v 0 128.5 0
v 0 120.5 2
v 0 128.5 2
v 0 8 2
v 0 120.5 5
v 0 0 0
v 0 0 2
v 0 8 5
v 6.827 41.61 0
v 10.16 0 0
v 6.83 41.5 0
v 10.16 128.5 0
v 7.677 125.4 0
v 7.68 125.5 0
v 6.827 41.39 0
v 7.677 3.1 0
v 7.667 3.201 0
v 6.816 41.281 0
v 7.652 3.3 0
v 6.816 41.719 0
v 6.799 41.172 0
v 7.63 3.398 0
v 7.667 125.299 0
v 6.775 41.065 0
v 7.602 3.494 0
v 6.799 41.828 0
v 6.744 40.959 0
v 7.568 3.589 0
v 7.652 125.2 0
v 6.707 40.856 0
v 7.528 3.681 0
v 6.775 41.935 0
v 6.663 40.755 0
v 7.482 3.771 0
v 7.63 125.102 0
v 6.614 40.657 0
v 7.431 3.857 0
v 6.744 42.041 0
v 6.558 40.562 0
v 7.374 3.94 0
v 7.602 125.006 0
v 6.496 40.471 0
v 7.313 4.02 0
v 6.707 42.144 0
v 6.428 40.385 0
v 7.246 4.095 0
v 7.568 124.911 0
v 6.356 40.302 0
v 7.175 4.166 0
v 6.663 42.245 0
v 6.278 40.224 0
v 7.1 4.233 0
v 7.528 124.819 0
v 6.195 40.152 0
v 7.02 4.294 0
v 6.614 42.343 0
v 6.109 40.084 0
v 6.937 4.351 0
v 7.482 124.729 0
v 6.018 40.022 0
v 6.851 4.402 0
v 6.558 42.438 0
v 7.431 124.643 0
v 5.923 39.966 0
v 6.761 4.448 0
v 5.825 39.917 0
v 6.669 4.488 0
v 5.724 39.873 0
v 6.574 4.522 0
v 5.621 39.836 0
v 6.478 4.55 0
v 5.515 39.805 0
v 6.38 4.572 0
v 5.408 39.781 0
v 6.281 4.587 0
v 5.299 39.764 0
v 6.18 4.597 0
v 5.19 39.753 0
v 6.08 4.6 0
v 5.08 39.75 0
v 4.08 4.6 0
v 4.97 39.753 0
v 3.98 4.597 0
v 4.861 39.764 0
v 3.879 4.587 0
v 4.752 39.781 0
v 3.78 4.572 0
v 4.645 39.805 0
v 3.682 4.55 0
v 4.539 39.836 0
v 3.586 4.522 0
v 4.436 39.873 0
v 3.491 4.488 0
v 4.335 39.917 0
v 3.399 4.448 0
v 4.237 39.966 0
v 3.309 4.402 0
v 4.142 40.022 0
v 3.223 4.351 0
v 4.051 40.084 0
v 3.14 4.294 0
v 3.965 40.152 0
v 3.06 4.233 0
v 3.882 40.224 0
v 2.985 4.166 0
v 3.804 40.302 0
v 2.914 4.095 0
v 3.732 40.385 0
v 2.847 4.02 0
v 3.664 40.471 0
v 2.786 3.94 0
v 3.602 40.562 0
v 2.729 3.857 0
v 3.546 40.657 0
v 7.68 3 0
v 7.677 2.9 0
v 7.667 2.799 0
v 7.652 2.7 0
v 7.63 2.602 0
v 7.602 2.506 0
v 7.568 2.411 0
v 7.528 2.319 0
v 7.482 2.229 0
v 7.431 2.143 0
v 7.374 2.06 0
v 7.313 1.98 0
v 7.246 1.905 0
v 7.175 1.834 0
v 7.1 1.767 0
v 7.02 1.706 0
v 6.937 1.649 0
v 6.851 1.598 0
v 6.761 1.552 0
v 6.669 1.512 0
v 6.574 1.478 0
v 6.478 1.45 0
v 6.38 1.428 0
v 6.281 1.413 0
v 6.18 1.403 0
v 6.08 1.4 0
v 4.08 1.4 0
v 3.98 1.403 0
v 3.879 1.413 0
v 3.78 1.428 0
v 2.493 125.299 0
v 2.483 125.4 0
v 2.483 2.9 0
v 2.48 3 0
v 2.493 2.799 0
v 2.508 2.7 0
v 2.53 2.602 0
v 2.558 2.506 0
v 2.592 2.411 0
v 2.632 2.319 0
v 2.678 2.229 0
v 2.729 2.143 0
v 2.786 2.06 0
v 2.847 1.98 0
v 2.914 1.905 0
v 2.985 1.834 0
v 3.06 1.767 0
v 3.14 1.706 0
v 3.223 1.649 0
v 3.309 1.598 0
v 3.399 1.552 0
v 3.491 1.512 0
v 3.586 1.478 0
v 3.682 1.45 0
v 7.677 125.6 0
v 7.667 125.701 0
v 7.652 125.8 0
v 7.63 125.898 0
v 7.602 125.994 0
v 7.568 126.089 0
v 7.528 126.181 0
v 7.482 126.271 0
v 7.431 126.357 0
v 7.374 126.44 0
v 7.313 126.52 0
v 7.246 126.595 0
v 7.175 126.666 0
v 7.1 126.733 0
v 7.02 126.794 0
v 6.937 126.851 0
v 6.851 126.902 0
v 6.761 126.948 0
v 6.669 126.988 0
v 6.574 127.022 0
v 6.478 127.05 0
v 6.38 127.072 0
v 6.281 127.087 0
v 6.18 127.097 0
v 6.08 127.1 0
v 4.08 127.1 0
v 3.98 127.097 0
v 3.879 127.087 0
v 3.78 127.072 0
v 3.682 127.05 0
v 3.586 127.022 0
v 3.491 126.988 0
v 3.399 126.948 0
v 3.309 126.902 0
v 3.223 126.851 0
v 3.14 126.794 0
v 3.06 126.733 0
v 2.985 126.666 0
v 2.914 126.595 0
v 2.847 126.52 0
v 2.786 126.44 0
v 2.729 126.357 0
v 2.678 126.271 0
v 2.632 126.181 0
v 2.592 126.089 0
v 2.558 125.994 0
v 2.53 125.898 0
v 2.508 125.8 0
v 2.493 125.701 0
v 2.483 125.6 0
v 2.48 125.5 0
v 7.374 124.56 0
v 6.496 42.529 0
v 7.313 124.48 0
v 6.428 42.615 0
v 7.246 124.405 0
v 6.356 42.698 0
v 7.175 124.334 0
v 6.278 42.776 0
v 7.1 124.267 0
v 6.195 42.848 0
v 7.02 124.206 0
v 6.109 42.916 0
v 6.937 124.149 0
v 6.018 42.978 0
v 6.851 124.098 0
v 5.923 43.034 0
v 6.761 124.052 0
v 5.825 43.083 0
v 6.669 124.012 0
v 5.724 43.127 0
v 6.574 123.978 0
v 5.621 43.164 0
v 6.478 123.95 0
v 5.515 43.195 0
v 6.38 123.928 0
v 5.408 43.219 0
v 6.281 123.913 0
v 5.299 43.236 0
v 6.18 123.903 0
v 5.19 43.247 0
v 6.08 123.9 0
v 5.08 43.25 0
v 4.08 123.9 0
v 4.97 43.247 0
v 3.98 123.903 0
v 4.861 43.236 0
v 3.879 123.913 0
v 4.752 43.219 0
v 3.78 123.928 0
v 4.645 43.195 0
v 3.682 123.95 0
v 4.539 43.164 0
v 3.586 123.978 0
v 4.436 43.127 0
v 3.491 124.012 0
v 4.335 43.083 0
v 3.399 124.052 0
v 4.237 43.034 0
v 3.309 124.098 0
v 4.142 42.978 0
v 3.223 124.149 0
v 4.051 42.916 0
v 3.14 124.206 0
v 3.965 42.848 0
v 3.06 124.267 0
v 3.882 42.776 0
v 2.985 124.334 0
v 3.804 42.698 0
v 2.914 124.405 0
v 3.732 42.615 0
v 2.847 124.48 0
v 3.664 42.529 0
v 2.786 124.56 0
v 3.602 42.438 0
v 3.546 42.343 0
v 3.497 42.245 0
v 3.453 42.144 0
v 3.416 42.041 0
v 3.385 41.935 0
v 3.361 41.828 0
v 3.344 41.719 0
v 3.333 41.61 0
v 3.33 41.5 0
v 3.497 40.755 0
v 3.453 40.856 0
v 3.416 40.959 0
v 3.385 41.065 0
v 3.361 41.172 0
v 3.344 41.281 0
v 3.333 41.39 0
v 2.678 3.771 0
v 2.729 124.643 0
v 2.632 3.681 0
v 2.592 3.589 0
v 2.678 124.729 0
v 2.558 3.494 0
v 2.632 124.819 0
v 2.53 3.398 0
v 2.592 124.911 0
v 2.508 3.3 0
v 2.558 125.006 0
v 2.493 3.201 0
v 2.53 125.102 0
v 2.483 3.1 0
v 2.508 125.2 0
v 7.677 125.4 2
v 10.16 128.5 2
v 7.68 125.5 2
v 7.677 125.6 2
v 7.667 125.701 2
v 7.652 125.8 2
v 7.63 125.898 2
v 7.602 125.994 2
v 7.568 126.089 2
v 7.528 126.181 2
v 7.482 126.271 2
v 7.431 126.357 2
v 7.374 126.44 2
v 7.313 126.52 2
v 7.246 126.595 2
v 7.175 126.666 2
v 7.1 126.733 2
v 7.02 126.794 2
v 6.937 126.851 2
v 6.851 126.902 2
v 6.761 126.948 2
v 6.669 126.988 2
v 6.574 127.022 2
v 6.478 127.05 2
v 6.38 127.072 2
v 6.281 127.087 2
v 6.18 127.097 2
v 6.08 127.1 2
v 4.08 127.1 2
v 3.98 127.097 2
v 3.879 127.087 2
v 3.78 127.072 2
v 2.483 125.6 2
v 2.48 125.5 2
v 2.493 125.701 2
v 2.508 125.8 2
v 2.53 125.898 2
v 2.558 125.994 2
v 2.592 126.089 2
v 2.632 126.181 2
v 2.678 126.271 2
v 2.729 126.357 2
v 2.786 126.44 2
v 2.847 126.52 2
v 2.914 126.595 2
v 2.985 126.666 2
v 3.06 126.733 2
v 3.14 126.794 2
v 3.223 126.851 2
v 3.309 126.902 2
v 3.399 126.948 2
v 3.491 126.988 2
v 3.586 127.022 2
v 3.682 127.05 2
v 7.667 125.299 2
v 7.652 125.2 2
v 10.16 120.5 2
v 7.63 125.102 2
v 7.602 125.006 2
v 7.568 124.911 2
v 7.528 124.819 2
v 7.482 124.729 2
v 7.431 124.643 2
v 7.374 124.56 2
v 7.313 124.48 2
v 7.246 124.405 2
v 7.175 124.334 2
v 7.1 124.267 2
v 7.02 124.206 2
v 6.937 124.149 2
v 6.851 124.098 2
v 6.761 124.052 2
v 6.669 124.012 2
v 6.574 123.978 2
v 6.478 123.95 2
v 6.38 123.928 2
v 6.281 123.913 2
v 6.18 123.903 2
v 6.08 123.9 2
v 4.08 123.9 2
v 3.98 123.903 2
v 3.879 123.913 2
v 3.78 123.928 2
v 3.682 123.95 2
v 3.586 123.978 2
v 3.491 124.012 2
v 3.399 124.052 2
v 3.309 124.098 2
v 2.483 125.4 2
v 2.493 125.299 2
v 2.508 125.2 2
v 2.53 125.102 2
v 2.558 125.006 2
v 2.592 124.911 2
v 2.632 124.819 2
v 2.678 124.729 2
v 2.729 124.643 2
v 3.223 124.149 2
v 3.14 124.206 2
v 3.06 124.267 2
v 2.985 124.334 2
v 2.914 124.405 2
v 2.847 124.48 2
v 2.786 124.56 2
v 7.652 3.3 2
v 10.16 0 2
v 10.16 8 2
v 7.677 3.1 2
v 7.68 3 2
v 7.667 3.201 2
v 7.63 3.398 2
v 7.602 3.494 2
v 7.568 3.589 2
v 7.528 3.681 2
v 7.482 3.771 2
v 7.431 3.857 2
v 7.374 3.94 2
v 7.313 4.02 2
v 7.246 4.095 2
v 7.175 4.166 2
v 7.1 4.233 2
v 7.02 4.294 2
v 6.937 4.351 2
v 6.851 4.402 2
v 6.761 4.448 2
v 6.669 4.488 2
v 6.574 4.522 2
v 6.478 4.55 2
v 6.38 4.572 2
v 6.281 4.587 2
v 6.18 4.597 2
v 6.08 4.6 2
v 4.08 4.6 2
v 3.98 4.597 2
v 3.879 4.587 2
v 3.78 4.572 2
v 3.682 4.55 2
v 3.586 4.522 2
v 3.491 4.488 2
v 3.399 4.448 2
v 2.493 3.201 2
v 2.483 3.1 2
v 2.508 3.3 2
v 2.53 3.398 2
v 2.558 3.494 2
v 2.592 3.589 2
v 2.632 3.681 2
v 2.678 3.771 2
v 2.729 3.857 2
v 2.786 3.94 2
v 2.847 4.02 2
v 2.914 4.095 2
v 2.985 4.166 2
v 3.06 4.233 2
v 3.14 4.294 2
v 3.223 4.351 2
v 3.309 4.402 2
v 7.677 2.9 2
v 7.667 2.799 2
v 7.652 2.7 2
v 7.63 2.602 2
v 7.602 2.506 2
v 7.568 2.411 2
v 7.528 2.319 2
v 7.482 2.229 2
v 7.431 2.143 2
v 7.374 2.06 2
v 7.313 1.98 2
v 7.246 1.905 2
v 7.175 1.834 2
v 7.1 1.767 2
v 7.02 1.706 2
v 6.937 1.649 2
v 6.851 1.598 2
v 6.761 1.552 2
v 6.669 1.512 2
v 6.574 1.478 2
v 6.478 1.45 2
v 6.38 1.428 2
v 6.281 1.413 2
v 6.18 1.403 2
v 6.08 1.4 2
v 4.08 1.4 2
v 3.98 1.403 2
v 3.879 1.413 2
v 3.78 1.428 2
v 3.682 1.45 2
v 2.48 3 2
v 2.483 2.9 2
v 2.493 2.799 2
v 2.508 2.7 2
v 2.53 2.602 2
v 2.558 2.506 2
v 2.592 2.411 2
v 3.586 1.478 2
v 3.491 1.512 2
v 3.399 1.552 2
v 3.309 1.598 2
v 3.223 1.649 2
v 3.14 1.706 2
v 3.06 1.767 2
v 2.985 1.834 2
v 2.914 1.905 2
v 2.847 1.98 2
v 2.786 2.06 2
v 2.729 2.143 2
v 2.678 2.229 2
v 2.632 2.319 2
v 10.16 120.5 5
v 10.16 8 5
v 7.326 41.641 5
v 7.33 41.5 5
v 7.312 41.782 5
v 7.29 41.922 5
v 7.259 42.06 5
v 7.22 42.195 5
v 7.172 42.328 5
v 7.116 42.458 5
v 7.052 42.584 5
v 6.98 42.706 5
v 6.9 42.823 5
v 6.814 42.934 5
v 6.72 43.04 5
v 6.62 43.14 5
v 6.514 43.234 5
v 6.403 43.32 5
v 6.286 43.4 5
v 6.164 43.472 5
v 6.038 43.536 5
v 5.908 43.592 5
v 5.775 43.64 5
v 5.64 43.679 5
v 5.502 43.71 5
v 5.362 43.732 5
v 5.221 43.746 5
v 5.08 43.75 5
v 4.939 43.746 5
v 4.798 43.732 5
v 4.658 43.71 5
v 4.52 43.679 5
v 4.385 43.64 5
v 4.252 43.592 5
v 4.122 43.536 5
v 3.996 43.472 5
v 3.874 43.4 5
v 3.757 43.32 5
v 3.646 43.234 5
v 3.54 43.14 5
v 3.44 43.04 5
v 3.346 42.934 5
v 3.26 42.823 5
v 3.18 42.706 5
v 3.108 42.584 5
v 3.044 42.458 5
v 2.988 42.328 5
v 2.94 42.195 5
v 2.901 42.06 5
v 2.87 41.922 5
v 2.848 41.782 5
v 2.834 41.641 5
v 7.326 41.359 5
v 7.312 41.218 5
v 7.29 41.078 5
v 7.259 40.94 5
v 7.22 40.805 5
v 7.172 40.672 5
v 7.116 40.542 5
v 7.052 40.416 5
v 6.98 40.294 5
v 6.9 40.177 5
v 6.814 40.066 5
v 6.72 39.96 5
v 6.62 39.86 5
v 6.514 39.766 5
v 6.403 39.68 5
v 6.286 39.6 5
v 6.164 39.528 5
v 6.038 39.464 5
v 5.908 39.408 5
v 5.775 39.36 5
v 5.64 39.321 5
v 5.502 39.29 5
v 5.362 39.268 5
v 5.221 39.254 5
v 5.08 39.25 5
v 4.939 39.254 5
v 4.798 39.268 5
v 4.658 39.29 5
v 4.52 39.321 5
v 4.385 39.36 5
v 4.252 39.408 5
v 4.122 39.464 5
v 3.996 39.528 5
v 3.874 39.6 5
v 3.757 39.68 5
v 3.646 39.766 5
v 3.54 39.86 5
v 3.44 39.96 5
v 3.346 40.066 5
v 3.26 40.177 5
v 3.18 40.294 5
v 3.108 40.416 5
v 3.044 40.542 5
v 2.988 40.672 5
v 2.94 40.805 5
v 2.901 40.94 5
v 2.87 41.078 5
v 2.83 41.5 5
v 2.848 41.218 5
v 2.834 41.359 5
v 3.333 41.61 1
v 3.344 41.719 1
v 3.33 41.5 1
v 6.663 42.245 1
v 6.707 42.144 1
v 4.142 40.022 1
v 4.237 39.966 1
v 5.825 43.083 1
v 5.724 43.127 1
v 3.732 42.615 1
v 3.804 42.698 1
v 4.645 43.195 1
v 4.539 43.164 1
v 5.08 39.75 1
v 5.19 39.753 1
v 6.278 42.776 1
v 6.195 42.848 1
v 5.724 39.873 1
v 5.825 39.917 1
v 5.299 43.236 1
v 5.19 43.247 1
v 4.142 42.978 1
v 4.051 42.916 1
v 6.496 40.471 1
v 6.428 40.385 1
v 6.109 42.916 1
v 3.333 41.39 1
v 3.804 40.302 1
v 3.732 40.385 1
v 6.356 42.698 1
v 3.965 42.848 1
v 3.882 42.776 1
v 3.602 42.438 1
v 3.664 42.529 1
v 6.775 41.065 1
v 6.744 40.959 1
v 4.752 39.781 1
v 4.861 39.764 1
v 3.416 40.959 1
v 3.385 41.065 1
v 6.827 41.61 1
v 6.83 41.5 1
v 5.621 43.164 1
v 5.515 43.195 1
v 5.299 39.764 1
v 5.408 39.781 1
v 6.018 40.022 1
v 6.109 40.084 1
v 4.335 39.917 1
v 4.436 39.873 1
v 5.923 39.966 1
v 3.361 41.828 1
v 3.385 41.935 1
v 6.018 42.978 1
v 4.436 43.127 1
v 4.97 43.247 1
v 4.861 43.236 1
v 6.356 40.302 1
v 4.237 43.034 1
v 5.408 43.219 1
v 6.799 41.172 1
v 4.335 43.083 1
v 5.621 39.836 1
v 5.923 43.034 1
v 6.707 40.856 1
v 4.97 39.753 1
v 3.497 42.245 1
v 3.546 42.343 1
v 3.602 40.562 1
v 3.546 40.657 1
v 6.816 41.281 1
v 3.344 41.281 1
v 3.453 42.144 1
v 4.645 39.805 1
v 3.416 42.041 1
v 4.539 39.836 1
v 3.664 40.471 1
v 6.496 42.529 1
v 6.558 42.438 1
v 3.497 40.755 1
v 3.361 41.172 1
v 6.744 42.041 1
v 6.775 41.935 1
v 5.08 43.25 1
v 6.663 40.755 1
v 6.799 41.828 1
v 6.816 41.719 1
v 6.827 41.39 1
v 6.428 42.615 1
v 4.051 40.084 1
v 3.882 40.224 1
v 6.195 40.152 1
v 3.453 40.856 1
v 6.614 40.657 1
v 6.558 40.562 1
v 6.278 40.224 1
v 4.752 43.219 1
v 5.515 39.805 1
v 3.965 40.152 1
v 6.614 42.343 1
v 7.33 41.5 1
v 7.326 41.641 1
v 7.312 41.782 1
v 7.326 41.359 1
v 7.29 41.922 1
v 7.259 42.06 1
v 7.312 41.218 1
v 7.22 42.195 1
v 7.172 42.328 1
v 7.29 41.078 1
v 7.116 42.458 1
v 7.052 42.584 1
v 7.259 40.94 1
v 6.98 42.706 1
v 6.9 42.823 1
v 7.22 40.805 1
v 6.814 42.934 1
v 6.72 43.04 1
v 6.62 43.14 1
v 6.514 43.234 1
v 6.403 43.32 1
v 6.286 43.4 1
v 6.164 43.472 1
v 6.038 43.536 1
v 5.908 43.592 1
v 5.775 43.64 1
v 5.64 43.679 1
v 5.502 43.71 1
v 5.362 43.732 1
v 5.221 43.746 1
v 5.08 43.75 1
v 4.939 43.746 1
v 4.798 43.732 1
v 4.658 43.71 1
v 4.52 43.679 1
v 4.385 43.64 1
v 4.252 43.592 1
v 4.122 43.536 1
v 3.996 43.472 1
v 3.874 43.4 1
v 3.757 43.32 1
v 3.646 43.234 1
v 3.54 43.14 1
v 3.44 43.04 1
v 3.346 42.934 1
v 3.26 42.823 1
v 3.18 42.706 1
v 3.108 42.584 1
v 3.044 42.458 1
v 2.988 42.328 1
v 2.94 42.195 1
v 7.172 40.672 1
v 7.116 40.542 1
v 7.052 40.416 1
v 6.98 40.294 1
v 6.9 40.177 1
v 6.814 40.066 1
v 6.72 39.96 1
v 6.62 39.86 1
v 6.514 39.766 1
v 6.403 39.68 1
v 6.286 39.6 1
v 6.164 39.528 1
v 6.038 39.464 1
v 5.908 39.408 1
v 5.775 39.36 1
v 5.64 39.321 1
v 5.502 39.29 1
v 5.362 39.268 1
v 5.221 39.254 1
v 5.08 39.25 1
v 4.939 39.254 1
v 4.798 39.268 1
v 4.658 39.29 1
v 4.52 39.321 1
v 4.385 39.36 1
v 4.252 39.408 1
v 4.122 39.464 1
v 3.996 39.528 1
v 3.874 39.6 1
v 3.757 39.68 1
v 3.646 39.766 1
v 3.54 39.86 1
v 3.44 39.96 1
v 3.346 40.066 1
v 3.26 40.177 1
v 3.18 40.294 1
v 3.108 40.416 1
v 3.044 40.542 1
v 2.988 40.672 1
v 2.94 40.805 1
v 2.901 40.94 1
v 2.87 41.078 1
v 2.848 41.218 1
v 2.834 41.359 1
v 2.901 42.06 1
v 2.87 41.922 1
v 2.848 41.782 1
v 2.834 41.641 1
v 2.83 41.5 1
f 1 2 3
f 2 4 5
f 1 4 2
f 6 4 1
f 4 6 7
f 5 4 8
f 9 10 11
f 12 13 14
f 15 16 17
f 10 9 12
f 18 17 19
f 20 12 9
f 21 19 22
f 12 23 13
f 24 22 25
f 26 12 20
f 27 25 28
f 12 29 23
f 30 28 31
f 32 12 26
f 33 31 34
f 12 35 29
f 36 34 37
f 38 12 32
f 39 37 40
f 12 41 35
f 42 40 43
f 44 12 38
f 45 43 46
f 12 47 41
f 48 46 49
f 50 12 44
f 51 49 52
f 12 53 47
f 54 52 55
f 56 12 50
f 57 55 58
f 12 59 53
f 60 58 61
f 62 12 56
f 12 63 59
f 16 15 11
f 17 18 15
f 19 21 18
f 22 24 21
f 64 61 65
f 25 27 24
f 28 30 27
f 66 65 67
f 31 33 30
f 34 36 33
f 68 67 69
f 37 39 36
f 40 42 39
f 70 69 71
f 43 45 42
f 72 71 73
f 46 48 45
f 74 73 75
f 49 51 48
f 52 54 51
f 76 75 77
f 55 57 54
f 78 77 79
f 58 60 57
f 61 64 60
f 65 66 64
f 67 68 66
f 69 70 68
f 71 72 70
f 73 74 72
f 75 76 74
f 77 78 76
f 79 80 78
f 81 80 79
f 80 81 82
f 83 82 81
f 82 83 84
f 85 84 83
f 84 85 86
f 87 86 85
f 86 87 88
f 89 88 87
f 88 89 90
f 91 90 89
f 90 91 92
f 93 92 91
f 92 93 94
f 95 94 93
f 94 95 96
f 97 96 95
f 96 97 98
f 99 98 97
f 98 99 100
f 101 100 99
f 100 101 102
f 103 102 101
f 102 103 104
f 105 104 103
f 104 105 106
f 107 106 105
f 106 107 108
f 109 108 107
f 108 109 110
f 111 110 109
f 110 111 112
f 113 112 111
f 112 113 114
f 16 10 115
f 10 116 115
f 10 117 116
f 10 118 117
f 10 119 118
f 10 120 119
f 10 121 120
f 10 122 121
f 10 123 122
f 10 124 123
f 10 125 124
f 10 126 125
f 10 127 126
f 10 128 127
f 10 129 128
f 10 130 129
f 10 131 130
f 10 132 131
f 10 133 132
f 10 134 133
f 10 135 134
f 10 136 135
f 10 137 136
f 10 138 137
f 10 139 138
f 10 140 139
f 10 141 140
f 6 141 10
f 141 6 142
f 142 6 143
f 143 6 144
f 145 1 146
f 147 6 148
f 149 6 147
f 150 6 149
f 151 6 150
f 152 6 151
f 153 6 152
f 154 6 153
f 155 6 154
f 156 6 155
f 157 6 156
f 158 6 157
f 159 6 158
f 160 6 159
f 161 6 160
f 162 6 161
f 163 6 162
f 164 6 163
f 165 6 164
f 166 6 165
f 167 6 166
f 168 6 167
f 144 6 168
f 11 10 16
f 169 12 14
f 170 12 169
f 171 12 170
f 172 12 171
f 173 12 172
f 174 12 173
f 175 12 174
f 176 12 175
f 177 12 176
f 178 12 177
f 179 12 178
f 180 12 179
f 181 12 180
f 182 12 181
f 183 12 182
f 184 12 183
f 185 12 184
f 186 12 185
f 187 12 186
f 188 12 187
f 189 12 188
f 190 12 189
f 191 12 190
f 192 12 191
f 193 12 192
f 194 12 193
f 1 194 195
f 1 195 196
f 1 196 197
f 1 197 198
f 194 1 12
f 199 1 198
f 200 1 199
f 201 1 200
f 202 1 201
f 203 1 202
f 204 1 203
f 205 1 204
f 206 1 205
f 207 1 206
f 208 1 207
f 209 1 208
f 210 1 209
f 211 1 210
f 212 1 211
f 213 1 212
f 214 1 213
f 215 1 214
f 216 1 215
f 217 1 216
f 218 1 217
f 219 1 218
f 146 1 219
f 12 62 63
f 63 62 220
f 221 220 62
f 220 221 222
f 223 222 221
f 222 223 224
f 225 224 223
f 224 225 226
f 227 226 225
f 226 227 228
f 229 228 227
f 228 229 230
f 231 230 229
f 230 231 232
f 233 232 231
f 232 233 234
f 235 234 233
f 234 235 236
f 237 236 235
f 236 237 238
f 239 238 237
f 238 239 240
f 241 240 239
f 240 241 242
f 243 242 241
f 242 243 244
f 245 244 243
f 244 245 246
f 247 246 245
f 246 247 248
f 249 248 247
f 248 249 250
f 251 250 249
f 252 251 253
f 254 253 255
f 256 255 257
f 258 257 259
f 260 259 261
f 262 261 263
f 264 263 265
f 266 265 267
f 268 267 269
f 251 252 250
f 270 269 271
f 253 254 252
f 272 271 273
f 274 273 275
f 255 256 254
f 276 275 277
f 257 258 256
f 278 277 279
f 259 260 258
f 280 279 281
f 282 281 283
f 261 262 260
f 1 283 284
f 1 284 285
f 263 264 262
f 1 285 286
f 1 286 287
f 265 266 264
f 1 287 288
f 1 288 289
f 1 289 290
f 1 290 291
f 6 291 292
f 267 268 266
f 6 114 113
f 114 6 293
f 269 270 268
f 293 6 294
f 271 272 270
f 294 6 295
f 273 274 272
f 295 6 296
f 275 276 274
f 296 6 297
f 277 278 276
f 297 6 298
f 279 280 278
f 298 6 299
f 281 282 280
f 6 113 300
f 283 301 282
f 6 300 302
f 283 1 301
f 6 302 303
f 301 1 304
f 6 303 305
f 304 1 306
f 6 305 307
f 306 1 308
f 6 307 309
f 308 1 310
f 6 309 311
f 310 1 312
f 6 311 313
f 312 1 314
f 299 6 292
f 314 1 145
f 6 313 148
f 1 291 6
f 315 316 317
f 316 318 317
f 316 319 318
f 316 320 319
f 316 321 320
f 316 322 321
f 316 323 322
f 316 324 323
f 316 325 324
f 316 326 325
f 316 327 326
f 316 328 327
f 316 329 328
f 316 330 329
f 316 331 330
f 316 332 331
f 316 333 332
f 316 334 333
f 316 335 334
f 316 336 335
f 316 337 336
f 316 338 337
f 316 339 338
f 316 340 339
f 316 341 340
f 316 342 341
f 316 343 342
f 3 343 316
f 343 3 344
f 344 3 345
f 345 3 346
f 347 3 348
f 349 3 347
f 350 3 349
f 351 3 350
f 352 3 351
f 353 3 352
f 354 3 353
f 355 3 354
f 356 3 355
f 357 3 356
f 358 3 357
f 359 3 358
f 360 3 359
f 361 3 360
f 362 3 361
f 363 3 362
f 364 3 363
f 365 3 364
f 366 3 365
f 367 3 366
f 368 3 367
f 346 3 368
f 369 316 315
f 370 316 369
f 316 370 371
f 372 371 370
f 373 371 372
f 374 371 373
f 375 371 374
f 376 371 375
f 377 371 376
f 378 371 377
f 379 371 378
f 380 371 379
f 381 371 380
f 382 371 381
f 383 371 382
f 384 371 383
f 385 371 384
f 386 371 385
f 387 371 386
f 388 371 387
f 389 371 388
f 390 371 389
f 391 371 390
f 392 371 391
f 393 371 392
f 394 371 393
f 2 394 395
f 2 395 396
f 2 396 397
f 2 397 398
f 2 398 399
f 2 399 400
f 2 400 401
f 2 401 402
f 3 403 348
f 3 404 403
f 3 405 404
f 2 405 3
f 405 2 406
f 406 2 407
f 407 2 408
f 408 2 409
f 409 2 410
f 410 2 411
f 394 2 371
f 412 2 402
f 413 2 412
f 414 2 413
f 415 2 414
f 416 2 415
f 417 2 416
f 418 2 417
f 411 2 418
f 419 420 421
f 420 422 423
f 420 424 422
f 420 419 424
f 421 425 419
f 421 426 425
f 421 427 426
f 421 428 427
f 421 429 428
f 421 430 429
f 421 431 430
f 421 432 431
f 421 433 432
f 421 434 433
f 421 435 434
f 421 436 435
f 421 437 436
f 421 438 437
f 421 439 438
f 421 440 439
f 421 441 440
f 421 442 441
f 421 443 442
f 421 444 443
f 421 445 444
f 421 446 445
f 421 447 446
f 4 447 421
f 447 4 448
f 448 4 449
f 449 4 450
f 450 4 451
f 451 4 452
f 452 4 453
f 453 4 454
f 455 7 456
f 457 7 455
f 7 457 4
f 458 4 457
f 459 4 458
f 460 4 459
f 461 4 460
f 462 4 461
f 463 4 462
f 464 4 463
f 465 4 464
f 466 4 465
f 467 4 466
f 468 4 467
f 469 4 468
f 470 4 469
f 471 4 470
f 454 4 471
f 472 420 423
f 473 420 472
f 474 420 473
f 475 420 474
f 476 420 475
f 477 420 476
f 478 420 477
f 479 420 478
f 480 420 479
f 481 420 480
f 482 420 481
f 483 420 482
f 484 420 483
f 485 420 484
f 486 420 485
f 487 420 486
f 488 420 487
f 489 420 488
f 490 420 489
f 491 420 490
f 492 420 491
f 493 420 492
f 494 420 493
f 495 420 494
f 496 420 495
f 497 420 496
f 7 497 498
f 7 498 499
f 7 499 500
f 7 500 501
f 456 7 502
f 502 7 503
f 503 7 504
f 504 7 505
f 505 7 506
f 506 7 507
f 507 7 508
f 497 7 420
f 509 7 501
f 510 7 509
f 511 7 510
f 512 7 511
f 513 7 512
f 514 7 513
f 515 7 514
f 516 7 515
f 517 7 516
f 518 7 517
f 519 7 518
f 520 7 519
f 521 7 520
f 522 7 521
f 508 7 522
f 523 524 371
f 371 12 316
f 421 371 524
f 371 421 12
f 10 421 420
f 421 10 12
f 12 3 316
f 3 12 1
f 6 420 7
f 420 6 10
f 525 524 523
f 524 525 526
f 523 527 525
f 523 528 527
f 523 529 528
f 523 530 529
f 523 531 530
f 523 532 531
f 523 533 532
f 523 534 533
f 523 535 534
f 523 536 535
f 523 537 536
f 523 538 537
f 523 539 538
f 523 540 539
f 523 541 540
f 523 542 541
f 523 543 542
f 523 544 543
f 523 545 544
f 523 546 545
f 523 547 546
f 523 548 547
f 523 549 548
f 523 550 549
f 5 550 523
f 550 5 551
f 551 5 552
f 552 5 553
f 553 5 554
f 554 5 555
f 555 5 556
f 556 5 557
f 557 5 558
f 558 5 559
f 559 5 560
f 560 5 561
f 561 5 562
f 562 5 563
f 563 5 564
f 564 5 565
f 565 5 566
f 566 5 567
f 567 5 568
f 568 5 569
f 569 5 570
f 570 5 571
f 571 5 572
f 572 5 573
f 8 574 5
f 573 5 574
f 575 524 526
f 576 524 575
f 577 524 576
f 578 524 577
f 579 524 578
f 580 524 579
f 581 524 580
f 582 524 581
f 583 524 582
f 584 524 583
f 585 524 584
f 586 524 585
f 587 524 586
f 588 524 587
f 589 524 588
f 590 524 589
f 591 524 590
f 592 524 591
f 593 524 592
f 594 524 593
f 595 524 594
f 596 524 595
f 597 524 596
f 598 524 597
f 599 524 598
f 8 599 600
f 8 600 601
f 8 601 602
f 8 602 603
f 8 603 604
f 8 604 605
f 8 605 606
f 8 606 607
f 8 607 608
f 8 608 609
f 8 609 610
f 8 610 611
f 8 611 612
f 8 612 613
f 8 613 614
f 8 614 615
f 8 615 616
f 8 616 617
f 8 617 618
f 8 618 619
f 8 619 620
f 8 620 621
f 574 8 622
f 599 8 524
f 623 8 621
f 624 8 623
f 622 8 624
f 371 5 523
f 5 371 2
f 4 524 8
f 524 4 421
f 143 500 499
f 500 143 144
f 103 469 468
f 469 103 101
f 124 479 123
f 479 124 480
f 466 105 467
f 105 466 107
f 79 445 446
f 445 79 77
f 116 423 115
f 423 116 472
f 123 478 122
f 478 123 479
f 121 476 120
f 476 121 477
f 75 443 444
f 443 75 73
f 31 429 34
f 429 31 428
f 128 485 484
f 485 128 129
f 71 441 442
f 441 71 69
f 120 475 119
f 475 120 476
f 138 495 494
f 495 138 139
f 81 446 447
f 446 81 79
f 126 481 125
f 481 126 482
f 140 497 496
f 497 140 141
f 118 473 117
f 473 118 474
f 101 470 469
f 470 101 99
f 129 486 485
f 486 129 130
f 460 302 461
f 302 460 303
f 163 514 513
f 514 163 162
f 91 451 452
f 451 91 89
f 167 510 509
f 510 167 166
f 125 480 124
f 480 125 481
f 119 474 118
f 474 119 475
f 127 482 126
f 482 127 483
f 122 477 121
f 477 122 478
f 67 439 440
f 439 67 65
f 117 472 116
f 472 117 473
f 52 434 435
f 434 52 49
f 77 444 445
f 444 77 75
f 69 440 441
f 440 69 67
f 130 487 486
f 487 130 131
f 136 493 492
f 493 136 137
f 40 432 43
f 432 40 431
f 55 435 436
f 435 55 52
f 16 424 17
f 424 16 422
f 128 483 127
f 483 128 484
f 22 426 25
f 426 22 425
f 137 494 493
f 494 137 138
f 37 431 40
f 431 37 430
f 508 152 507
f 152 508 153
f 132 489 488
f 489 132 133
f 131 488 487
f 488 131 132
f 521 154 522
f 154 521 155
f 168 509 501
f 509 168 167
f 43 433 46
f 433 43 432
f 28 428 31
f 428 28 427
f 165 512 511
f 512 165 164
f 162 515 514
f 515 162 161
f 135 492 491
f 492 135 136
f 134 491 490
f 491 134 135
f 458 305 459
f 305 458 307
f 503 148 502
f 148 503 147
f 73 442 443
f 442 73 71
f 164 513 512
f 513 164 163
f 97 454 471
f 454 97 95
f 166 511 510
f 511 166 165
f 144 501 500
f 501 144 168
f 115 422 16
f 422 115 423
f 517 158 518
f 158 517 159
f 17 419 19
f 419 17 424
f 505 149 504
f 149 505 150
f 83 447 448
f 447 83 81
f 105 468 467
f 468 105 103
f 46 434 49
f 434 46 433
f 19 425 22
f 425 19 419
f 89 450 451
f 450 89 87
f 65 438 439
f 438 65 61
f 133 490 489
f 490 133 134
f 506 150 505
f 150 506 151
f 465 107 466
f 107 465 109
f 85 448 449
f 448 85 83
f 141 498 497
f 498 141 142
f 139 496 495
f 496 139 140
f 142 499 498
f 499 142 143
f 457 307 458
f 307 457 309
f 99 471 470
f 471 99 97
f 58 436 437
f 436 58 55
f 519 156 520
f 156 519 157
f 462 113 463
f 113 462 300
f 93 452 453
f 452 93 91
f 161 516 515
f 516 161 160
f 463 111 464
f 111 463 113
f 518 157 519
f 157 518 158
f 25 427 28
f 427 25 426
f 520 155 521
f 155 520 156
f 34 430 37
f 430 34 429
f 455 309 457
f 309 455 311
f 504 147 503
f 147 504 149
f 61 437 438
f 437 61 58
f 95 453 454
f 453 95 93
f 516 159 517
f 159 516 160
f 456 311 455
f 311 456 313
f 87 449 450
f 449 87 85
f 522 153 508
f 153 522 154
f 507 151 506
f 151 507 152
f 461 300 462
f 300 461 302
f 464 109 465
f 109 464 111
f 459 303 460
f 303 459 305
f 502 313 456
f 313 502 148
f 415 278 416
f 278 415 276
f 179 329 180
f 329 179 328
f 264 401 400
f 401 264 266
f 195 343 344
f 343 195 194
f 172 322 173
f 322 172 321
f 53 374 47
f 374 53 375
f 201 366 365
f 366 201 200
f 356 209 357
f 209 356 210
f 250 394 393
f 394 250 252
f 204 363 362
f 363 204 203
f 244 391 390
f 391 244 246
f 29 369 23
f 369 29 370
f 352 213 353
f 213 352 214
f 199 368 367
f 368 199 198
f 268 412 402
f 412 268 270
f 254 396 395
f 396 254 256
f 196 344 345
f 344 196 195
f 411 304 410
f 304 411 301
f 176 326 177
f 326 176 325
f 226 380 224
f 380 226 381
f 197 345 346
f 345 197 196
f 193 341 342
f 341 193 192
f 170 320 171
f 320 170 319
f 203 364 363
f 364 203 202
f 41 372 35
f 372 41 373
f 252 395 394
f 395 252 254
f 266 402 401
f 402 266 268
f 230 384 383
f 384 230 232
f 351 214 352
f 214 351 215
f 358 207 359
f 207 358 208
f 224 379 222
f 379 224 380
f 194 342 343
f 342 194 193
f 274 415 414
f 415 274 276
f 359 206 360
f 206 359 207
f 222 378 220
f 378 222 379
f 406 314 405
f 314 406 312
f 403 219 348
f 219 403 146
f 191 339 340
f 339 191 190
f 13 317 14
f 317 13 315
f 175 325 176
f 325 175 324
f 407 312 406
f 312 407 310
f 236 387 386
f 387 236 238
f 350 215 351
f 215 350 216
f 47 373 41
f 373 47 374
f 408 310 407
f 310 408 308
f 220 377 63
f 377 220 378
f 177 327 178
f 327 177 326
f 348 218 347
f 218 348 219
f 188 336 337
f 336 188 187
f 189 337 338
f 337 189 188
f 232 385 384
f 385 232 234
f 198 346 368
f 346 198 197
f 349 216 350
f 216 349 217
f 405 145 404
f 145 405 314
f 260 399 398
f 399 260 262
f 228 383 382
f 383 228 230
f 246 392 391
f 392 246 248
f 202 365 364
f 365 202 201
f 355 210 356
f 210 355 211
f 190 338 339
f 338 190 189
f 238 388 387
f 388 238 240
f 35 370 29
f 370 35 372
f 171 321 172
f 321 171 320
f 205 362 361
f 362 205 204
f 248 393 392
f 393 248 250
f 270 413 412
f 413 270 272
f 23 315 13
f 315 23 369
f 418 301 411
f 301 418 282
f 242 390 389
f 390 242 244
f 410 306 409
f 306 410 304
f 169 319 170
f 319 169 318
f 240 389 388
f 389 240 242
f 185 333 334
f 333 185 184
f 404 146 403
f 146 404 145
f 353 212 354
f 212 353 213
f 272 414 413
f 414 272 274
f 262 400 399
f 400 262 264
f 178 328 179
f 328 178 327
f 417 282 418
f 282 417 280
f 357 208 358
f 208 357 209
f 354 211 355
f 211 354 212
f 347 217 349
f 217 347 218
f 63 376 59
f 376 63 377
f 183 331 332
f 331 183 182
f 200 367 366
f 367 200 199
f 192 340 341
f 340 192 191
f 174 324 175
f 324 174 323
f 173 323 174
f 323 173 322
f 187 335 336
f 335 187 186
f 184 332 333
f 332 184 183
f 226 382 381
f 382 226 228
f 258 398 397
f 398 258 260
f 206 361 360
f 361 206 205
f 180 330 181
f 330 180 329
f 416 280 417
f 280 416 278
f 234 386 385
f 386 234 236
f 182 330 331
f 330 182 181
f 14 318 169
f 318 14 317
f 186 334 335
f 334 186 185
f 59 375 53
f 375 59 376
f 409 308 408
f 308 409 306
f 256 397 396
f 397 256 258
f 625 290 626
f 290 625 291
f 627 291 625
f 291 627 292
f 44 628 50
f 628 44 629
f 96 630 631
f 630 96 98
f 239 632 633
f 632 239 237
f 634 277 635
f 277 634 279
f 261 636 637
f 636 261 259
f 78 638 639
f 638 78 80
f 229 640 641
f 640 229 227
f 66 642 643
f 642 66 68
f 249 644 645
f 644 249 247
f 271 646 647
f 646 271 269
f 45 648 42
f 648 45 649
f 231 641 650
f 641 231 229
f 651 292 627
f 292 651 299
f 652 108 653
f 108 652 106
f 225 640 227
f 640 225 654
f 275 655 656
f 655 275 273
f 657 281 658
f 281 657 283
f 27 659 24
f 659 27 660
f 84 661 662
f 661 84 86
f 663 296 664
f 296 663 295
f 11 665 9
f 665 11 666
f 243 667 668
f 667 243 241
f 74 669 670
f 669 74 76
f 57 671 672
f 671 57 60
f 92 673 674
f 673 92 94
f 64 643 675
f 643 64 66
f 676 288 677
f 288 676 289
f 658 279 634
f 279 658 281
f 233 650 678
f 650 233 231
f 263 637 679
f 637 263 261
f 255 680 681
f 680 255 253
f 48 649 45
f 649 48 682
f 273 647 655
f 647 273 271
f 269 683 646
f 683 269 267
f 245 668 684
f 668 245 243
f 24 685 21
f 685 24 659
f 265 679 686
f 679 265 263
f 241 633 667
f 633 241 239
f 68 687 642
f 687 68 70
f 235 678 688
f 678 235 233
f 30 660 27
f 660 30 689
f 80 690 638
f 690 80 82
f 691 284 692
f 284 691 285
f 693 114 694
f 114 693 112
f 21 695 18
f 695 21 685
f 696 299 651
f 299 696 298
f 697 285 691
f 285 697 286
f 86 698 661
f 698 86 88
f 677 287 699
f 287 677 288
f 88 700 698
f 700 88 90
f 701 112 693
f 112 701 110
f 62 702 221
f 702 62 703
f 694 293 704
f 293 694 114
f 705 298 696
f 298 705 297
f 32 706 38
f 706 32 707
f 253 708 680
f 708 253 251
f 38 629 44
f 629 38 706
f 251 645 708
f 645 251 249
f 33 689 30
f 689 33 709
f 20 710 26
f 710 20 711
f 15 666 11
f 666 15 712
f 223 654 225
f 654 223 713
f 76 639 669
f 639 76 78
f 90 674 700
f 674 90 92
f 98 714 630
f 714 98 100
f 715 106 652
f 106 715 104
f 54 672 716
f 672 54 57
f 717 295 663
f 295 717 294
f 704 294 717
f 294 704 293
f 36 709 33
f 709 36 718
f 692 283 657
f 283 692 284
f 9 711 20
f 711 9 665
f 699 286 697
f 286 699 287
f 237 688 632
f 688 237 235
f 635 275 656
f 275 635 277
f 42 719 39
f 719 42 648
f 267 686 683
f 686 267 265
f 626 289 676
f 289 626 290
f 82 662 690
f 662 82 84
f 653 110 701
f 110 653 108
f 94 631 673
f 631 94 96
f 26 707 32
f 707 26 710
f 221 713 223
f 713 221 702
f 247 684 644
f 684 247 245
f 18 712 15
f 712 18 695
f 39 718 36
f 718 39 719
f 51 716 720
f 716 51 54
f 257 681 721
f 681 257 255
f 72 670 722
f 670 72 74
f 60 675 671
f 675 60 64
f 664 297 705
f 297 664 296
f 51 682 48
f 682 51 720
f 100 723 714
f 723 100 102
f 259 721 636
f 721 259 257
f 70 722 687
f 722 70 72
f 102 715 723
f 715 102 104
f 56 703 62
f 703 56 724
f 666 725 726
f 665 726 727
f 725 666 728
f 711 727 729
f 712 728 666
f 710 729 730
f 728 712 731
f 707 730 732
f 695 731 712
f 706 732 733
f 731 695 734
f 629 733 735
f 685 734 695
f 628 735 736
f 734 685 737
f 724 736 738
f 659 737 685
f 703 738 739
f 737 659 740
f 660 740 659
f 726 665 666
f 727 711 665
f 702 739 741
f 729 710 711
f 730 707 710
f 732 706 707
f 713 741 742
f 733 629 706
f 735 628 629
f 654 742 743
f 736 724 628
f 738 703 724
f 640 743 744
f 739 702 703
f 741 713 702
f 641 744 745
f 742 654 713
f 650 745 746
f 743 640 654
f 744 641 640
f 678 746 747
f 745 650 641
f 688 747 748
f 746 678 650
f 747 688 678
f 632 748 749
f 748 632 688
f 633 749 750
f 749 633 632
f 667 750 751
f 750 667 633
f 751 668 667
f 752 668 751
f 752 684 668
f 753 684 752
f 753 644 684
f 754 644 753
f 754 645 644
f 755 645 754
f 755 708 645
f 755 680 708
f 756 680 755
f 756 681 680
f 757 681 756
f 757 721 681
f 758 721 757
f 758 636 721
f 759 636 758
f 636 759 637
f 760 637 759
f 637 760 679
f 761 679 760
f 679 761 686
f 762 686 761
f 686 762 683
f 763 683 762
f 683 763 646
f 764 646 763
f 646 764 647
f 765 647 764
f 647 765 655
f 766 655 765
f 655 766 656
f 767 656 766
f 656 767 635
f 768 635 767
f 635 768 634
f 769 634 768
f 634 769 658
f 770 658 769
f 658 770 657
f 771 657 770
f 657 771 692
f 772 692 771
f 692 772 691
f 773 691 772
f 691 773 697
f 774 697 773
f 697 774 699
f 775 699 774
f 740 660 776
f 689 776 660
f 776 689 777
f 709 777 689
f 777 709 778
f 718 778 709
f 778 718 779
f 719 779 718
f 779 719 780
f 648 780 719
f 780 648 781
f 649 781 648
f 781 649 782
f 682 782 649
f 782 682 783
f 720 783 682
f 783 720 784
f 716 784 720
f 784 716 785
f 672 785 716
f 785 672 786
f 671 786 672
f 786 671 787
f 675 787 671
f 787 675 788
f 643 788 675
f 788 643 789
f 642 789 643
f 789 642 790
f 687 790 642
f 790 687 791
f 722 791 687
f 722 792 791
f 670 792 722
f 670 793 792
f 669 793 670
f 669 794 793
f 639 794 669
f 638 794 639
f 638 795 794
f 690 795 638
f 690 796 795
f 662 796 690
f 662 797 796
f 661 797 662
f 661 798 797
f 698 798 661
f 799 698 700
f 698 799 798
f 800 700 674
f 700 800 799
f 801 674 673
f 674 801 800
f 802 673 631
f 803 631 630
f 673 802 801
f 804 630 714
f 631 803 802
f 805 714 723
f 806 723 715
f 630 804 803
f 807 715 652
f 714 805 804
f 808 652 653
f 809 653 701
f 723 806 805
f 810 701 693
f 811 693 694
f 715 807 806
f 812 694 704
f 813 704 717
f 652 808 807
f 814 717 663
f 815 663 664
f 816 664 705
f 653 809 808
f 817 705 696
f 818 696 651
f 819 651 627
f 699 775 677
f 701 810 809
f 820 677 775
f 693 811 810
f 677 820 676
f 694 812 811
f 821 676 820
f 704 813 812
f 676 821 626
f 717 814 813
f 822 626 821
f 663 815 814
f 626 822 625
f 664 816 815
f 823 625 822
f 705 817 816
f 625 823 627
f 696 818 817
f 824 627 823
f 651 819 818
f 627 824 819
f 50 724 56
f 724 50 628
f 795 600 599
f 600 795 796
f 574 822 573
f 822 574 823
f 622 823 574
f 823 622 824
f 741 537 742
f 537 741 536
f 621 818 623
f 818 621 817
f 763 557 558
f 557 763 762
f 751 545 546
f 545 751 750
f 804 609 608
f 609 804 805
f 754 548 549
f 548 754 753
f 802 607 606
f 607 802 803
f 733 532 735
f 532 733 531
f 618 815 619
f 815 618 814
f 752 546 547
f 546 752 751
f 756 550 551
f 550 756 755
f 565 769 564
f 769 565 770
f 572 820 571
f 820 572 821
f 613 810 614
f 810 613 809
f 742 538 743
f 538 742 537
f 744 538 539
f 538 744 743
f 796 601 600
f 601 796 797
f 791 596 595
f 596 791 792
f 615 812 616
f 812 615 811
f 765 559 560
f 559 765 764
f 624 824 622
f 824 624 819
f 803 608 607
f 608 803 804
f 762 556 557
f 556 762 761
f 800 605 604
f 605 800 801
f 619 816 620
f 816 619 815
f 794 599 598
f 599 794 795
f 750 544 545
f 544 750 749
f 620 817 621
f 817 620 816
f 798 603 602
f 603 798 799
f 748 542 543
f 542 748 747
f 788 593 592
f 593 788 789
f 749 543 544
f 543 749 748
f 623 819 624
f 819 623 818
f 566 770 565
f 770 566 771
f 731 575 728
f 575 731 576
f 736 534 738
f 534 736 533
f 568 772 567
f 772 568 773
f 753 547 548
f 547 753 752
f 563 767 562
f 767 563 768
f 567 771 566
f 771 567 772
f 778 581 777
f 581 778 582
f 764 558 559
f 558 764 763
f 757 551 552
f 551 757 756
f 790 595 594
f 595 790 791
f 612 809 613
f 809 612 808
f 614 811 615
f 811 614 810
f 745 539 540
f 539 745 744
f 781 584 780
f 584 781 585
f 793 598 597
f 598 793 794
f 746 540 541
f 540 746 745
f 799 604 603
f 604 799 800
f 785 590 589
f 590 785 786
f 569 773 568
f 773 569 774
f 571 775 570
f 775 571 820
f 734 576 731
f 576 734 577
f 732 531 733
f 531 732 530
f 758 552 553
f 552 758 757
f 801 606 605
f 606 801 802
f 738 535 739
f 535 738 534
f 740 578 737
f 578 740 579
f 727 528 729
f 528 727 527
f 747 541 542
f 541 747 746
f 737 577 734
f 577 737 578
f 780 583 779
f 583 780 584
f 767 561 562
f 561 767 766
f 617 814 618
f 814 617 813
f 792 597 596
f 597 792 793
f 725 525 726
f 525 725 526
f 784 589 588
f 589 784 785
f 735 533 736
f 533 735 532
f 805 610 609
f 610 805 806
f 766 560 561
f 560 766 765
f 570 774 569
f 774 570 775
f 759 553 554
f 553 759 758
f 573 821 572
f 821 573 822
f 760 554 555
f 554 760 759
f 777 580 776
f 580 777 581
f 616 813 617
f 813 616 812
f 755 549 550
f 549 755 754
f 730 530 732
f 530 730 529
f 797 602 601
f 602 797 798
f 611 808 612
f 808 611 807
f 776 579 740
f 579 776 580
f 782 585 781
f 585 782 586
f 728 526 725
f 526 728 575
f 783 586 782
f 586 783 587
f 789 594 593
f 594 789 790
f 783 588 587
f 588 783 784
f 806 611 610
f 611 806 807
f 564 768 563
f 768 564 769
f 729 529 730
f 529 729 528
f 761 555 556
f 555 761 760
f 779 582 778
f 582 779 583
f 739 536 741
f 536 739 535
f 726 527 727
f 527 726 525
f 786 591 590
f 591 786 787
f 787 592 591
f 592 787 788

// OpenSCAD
// file: ../templates/EuroPanelMaker/components/switch.scad
tolerance = 0.3;
$fn = $preview ? 20 : 100;

module switch(width=8){
    cylinder(r = 3.5 + tolerance, h = 8);
    
    translate([0, 0, -7.5])
    cube([width + tolerance * 2, 13 + tolerance * 2, 15], center = true);
}

switch();
// file: ../templates/EuroPanelMaker/components/mounting_tab.scad
$fn = $preview ? 20 : 100;

module mounting_tab() {
    thickness = 6;
    height = 27;
    width = 17;
    
    difference() {
        union() {
            cube([thickness, width, height]);
            
            translate([thickness, 0, 0])
            difference() {
                cube([6, width, 6]);
                
                rotate([90, 0, 0])
                translate([6, 6, -8.5])
                cylinder(r = 6, h = 17, center = true);
            }
        }
        
        union() {
            rotate([0, 90, 0])
            union() {
                hull() {
                    translate([-22.5, 8.5, 0])
                    cylinder(r = 1.5, h = thickness);
                    
                    translate([-18, 8.5, 0])
                    cylinder(r = 1.5, h = thickness);
                }
                
                hull() {
                    translate([-22.5, 8.5, -1.5])
                    cylinder(r = 3, h = 3);
                    
                    
                    translate([-18, 8.5, -1.5])
                    cylinder(r = 3, h = 3);
                }
            }
            
            translate([thickness - 1.5, 0, height - 11])
            cube([1.5, width, 11]);
        }
    }
}

mounting_tab();
// file: ../templates/EuroPanelMaker/components/pot_alpha_16mm.scad
tolerance = 0.3;
$fn = $preview ? 20 : 100;

module pot_alpha_16mm() {
    cylinder(r = 3.5 + tolerance, h = 8);
    
    translate([0, 0, -0.5])
    cylinder(r = 5.4 + tolerance, h = 0.5);
       
    translate([0, 0, -10.5])
    union() {
        translate([-8, -14, 0])
        cube([16, 14, 10]);
        
        cylinder(r = 9.5 + tolerance, h = 10);
    }
}

pot_alpha_16mm();
// file: ../templates/EuroPanelMaker/components/led.scad
tolerance = 0.3;
$fn = $preview ? 20 : 100;

module led(d = 3) {
    translate([0, 1.5, 0]){
        cylinder(d = d + (2 * tolerance), h = 2.5);
        
        translate([0, 0, -4])
        cylinder(d = d + 1 + (2 * tolerance), h = 4);
        
        translate([0, -1.5, -7])
        cube([0.8, 0.8, 7], center=true);
        
        translate([0, 1.5, -5])
        cube([0.8, 0.8, 5], center=true);   
    }
}

led();
// file: ../templates/EuroPanelMaker/components/jack_35mm.scad
tolerance = 0.3;
$fn = $preview ? 20 : 100;

module jack_35mm() {
    cylinder(r = 3 + tolerance, h = 5);
    
    translate([0, 0, -1.1])
    cylinder(r = 4.2, h = 1.2);
        
    translate([-1.5, 0, -14])
    cube([3, 10, 13]);

    box_width = 9 + tolerance;
    translate([-box_width / 2, -6 - tolerance / 2, -14])
    cube([box_width, 10.6 + tolerance, 13]);
}

jack_35mm();
// file: ../templates/EuroPanelMaker/panel.scad
use <components/jack_35mm.scad>
use <components/led.scad>
use <components/pot_alpha_16mm.scad>
use <components/mounting_tab.scad>
use <components/switch.scad>

eurorack_h = 128.5;
eurorack_w = 5.08;

panel_thickness = 2; // thickness
component_depth = 1;
text_depth = 1.4;

rib_margin = 8;
rib_thickness = 3;
    
hp = 6;
w = hp * eurorack_w;
c = w / 2;

title = "Test";
title_font_size = 4.5;
title_font = "Liberation Sans:style=bold";
title_x = w / 2;
title_y = 118;
title_rotate = 0;

pots = [];
leds = [];
jacks = [];
switches = [];
labels = [];
rectangular_holes = []; // [3, 100, x1, y1, x2, y2]

label_font = "Liberation Sans:style=bold";
label_font_size = 3;
pot_label_distance = 12;
pot_label_font_size = 3;
jack_label_distance = 8;
jack_label_font_size = 3;
switch_label_distance = 12;
switch_label_font_size = 3;

// Flip panel for 3D printing
panel_flipped = false;
panel_translate_x = panel_flipped ? w : 0;
panel_translate_z = panel_flipped ? panel_thickness : 0;
panel_rotate = panel_flipped ? 180 : 0;

margin = 0;

module generatePanel() {
    $fn = $preview ? 20 : 100;

    echo("Panel Maker:", hp = hp, w = w, title = title);   

    translate([panel_translate_x, 0, panel_translate_z])
    rotate([0, panel_rotate, 0])
    difference(){
        union(){
            translate([-margin, 0, 0])
            union() {
                cube([w + margin * 2, eurorack_h, panel_thickness]);
                
                translate([0, rib_margin, -rib_thickness])
                cube([w + margin * 2, eurorack_h - rib_margin * 2, rib_thickness]);
            }
        }
        
        union(){
            generate_title();
            generate_mounting_holes();
            
            for (idx = [0 : len(pots)]) {
                if (pots[idx]) {
                    echo("POT:", idx = pots[idx]);
                    generate_pots(pots[idx]);
                }
            }
            
            for (idx = [0 : len(leds)]) {
                if (leds[idx]) {
                    echo("LED:", idx = leds[idx]);
                    generate_leds(leds[idx]);
                }
            }
            
            for (idx = [0 : len(jacks)]) {
                if (jacks[idx]) {
                    echo("JACK:", idx = jacks[idx]);
                    generate_jacks(jacks[idx]);
                }
            }
            
            for (idx = [0 : len(switches)]) {
                if (switches[idx]) {
                    echo("SWITCH:", idx = switches[idx]);
                    generate_switches(switches[idx]);
                }
            }
            
            for (idx = [0 : len(labels)]) {
                if (labels[idx]) {
                    echo("LABEL:", idx = labels[idx]);
                    generate_extra_labels(labels[idx]);
                }
            }
            
            for (idx = [0 : len(rectangular_holes)]) {
                if (rectangular_holes[idx]) {
                    echo("HOLE:", idx = rectangular_holes[idx]);
                    generate_rectangular_holes(rectangular_holes[idx]);
                }
            }
        }
    }

}

module generate_rectangular_holes(params = [3, 100, 25, 20, 30, 30]) {
    translate([eurorack_w * params[0], params[1], 0 ])
    union() {
        #cube([params[2], params[3], panel_thickness*2], center=true);
        
        translate([0, 0, -panel_thickness])
        #cube([params[4], params[5], panel_thickness], center=true);   
    }
}
    
module generate_title() {
    translate([title_x, title_y, panel_thickness - text_depth])
    rotate([0, 0, title_rotate])
    linear_extrude(height = text_depth + 1)
    text(title, font = title_font, size = title_font_size, halign = "center"); 
}

module generate_mounting_holes(params=[2, 95, "Label"]) {
    if (hp == 1){
        translate([c, 3, 0])
        cylinder(r = 1.6, h = 10, center = true);
        
        translate([c, eurorack_h - 3, 0])
        cylinder(r = 1.6, h = 10, center = true);
    } else if (hp == 2){
        hull(){
            translate([c - 1, 3, 0])
            cylinder(r = 1.6, h = 10, center = true);
            
            translate([c + 1, 3, 0])
            cylinder(r = 1.6, h = 10, center = true);
        }
        
        hull(){
            translate([c - 1, eurorack_h - 3, 0])
            cylinder(r = 1.6, h = 10, center = true);
            
            translate([c + 1, eurorack_h - 3, 0])
            cylinder(r = 1.6, h = 10, center = true);
        }
    } else {
        hull(){
            translate([6, 3, 0])
            cylinder(r = 1.6, h = 10, center = true);
            
            translate([9, 3, 0])
            cylinder(r = 1.6, h = 10, center = true);
        }
        
        hull(){
            translate([6, eurorack_h - 3, 0])
            cylinder(r = 1.6, h = 10, center = true); 
            
            translate([9, eurorack_h - 3, 0])
            cylinder(r = 1.6, h = 10, center = true);  
        }
    }
    
    if (hp >= 5){
        hull(){
            translate([w - 6, 3, 0])
            cylinder(r = 1.6, h = 10, center = true);
            
            translate([w - 9, 3, 0])
            cylinder(r = 1.6, h = 10, center = true);
        }
        hull(){
            translate([w - 6, eurorack_h - 3, 0])
            cylinder(r = 1.6, h = 10, center = true);
            
            translate([w - 9, eurorack_h - 3, 0])
            cylinder(r = 1.6, h = 10, center = true);
        }
    } 
}

module generate_extra_labels(params=[2, 95, "Label"]) {
    translate([eurorack_w * params[0], params[1], panel_thickness - text_depth ])
    rotate([0, 0, params[3] ? params[3] : 0])
    linear_extrude(height = text_depth + 1)
    text(params[2], font = label_font, size = label_font_size, halign = "center");
}

module generate_pots(params=[2, 95, "Label"]) {
    translate([eurorack_w * params[0], params[1], component_depth])
    rotate([0, 0, params[3] ? params[3] : 0])
    #pot_alpha_16mm();

    translate([eurorack_w * params[0], params[1] + pot_label_distance, panel_thickness - text_depth])
    linear_extrude(height = text_depth + 1)
    text(params[2], font = label_font, size = pot_label_font_size, halign = "center", valign = "center");
}

module generate_jacks(params=[2, 95, "Label"]){
    translate([eurorack_w * params[0], params[1], component_depth])
    rotate([0, 0, params[3] ? params[3] : 0])
    #jack_35mm();

    translate([eurorack_w * params[0], params[1] + jack_label_distance, panel_thickness - text_depth])
    linear_extrude(height = text_depth + 1)
    text(params[2], font = label_font, size = jack_label_font_size, halign = "center", valign = "center");
}

module generate_switches(params=[2, 95, "Label", ""]){
    translate([eurorack_w * params[0], params[1], component_depth])
    rotate([0, 0, params[4] ? params[4] : 0])
    #switch();

    translate([eurorack_w * params[0], params[1] + switch_label_distance, panel_thickness - text_depth])
    linear_extrude(height = text_depth + 1)
    text(params[2], font = label_font, size = switch_label_font_size, halign = "center", valign = "center");
    
    translate([eurorack_w * params[0], params[1] - switch_label_distance, panel_thickness - text_depth])
    linear_extrude(height = text_depth + 1)
    text(params[3], font = label_font, size = switch_label_font_size, halign = "center", valign = "center");
}


module generate_leds(params=[2, 60, 3]){
    translate([eurorack_w * params[0], params[1], component_depth])
    #led(d = params[2]);
}

// uncomment the following line for testing, otherwise it causes panels to generate twice
//generatePanel();
// main file
include <../templates/EuroPanelMaker/panel.scad>

hp = 2;
title = "";

toggle_switches = [
    [1, 85, "On"]
];

leds = [
    [1, 40, 2.9]
];

panel_flipped = true;
generatePanel();
